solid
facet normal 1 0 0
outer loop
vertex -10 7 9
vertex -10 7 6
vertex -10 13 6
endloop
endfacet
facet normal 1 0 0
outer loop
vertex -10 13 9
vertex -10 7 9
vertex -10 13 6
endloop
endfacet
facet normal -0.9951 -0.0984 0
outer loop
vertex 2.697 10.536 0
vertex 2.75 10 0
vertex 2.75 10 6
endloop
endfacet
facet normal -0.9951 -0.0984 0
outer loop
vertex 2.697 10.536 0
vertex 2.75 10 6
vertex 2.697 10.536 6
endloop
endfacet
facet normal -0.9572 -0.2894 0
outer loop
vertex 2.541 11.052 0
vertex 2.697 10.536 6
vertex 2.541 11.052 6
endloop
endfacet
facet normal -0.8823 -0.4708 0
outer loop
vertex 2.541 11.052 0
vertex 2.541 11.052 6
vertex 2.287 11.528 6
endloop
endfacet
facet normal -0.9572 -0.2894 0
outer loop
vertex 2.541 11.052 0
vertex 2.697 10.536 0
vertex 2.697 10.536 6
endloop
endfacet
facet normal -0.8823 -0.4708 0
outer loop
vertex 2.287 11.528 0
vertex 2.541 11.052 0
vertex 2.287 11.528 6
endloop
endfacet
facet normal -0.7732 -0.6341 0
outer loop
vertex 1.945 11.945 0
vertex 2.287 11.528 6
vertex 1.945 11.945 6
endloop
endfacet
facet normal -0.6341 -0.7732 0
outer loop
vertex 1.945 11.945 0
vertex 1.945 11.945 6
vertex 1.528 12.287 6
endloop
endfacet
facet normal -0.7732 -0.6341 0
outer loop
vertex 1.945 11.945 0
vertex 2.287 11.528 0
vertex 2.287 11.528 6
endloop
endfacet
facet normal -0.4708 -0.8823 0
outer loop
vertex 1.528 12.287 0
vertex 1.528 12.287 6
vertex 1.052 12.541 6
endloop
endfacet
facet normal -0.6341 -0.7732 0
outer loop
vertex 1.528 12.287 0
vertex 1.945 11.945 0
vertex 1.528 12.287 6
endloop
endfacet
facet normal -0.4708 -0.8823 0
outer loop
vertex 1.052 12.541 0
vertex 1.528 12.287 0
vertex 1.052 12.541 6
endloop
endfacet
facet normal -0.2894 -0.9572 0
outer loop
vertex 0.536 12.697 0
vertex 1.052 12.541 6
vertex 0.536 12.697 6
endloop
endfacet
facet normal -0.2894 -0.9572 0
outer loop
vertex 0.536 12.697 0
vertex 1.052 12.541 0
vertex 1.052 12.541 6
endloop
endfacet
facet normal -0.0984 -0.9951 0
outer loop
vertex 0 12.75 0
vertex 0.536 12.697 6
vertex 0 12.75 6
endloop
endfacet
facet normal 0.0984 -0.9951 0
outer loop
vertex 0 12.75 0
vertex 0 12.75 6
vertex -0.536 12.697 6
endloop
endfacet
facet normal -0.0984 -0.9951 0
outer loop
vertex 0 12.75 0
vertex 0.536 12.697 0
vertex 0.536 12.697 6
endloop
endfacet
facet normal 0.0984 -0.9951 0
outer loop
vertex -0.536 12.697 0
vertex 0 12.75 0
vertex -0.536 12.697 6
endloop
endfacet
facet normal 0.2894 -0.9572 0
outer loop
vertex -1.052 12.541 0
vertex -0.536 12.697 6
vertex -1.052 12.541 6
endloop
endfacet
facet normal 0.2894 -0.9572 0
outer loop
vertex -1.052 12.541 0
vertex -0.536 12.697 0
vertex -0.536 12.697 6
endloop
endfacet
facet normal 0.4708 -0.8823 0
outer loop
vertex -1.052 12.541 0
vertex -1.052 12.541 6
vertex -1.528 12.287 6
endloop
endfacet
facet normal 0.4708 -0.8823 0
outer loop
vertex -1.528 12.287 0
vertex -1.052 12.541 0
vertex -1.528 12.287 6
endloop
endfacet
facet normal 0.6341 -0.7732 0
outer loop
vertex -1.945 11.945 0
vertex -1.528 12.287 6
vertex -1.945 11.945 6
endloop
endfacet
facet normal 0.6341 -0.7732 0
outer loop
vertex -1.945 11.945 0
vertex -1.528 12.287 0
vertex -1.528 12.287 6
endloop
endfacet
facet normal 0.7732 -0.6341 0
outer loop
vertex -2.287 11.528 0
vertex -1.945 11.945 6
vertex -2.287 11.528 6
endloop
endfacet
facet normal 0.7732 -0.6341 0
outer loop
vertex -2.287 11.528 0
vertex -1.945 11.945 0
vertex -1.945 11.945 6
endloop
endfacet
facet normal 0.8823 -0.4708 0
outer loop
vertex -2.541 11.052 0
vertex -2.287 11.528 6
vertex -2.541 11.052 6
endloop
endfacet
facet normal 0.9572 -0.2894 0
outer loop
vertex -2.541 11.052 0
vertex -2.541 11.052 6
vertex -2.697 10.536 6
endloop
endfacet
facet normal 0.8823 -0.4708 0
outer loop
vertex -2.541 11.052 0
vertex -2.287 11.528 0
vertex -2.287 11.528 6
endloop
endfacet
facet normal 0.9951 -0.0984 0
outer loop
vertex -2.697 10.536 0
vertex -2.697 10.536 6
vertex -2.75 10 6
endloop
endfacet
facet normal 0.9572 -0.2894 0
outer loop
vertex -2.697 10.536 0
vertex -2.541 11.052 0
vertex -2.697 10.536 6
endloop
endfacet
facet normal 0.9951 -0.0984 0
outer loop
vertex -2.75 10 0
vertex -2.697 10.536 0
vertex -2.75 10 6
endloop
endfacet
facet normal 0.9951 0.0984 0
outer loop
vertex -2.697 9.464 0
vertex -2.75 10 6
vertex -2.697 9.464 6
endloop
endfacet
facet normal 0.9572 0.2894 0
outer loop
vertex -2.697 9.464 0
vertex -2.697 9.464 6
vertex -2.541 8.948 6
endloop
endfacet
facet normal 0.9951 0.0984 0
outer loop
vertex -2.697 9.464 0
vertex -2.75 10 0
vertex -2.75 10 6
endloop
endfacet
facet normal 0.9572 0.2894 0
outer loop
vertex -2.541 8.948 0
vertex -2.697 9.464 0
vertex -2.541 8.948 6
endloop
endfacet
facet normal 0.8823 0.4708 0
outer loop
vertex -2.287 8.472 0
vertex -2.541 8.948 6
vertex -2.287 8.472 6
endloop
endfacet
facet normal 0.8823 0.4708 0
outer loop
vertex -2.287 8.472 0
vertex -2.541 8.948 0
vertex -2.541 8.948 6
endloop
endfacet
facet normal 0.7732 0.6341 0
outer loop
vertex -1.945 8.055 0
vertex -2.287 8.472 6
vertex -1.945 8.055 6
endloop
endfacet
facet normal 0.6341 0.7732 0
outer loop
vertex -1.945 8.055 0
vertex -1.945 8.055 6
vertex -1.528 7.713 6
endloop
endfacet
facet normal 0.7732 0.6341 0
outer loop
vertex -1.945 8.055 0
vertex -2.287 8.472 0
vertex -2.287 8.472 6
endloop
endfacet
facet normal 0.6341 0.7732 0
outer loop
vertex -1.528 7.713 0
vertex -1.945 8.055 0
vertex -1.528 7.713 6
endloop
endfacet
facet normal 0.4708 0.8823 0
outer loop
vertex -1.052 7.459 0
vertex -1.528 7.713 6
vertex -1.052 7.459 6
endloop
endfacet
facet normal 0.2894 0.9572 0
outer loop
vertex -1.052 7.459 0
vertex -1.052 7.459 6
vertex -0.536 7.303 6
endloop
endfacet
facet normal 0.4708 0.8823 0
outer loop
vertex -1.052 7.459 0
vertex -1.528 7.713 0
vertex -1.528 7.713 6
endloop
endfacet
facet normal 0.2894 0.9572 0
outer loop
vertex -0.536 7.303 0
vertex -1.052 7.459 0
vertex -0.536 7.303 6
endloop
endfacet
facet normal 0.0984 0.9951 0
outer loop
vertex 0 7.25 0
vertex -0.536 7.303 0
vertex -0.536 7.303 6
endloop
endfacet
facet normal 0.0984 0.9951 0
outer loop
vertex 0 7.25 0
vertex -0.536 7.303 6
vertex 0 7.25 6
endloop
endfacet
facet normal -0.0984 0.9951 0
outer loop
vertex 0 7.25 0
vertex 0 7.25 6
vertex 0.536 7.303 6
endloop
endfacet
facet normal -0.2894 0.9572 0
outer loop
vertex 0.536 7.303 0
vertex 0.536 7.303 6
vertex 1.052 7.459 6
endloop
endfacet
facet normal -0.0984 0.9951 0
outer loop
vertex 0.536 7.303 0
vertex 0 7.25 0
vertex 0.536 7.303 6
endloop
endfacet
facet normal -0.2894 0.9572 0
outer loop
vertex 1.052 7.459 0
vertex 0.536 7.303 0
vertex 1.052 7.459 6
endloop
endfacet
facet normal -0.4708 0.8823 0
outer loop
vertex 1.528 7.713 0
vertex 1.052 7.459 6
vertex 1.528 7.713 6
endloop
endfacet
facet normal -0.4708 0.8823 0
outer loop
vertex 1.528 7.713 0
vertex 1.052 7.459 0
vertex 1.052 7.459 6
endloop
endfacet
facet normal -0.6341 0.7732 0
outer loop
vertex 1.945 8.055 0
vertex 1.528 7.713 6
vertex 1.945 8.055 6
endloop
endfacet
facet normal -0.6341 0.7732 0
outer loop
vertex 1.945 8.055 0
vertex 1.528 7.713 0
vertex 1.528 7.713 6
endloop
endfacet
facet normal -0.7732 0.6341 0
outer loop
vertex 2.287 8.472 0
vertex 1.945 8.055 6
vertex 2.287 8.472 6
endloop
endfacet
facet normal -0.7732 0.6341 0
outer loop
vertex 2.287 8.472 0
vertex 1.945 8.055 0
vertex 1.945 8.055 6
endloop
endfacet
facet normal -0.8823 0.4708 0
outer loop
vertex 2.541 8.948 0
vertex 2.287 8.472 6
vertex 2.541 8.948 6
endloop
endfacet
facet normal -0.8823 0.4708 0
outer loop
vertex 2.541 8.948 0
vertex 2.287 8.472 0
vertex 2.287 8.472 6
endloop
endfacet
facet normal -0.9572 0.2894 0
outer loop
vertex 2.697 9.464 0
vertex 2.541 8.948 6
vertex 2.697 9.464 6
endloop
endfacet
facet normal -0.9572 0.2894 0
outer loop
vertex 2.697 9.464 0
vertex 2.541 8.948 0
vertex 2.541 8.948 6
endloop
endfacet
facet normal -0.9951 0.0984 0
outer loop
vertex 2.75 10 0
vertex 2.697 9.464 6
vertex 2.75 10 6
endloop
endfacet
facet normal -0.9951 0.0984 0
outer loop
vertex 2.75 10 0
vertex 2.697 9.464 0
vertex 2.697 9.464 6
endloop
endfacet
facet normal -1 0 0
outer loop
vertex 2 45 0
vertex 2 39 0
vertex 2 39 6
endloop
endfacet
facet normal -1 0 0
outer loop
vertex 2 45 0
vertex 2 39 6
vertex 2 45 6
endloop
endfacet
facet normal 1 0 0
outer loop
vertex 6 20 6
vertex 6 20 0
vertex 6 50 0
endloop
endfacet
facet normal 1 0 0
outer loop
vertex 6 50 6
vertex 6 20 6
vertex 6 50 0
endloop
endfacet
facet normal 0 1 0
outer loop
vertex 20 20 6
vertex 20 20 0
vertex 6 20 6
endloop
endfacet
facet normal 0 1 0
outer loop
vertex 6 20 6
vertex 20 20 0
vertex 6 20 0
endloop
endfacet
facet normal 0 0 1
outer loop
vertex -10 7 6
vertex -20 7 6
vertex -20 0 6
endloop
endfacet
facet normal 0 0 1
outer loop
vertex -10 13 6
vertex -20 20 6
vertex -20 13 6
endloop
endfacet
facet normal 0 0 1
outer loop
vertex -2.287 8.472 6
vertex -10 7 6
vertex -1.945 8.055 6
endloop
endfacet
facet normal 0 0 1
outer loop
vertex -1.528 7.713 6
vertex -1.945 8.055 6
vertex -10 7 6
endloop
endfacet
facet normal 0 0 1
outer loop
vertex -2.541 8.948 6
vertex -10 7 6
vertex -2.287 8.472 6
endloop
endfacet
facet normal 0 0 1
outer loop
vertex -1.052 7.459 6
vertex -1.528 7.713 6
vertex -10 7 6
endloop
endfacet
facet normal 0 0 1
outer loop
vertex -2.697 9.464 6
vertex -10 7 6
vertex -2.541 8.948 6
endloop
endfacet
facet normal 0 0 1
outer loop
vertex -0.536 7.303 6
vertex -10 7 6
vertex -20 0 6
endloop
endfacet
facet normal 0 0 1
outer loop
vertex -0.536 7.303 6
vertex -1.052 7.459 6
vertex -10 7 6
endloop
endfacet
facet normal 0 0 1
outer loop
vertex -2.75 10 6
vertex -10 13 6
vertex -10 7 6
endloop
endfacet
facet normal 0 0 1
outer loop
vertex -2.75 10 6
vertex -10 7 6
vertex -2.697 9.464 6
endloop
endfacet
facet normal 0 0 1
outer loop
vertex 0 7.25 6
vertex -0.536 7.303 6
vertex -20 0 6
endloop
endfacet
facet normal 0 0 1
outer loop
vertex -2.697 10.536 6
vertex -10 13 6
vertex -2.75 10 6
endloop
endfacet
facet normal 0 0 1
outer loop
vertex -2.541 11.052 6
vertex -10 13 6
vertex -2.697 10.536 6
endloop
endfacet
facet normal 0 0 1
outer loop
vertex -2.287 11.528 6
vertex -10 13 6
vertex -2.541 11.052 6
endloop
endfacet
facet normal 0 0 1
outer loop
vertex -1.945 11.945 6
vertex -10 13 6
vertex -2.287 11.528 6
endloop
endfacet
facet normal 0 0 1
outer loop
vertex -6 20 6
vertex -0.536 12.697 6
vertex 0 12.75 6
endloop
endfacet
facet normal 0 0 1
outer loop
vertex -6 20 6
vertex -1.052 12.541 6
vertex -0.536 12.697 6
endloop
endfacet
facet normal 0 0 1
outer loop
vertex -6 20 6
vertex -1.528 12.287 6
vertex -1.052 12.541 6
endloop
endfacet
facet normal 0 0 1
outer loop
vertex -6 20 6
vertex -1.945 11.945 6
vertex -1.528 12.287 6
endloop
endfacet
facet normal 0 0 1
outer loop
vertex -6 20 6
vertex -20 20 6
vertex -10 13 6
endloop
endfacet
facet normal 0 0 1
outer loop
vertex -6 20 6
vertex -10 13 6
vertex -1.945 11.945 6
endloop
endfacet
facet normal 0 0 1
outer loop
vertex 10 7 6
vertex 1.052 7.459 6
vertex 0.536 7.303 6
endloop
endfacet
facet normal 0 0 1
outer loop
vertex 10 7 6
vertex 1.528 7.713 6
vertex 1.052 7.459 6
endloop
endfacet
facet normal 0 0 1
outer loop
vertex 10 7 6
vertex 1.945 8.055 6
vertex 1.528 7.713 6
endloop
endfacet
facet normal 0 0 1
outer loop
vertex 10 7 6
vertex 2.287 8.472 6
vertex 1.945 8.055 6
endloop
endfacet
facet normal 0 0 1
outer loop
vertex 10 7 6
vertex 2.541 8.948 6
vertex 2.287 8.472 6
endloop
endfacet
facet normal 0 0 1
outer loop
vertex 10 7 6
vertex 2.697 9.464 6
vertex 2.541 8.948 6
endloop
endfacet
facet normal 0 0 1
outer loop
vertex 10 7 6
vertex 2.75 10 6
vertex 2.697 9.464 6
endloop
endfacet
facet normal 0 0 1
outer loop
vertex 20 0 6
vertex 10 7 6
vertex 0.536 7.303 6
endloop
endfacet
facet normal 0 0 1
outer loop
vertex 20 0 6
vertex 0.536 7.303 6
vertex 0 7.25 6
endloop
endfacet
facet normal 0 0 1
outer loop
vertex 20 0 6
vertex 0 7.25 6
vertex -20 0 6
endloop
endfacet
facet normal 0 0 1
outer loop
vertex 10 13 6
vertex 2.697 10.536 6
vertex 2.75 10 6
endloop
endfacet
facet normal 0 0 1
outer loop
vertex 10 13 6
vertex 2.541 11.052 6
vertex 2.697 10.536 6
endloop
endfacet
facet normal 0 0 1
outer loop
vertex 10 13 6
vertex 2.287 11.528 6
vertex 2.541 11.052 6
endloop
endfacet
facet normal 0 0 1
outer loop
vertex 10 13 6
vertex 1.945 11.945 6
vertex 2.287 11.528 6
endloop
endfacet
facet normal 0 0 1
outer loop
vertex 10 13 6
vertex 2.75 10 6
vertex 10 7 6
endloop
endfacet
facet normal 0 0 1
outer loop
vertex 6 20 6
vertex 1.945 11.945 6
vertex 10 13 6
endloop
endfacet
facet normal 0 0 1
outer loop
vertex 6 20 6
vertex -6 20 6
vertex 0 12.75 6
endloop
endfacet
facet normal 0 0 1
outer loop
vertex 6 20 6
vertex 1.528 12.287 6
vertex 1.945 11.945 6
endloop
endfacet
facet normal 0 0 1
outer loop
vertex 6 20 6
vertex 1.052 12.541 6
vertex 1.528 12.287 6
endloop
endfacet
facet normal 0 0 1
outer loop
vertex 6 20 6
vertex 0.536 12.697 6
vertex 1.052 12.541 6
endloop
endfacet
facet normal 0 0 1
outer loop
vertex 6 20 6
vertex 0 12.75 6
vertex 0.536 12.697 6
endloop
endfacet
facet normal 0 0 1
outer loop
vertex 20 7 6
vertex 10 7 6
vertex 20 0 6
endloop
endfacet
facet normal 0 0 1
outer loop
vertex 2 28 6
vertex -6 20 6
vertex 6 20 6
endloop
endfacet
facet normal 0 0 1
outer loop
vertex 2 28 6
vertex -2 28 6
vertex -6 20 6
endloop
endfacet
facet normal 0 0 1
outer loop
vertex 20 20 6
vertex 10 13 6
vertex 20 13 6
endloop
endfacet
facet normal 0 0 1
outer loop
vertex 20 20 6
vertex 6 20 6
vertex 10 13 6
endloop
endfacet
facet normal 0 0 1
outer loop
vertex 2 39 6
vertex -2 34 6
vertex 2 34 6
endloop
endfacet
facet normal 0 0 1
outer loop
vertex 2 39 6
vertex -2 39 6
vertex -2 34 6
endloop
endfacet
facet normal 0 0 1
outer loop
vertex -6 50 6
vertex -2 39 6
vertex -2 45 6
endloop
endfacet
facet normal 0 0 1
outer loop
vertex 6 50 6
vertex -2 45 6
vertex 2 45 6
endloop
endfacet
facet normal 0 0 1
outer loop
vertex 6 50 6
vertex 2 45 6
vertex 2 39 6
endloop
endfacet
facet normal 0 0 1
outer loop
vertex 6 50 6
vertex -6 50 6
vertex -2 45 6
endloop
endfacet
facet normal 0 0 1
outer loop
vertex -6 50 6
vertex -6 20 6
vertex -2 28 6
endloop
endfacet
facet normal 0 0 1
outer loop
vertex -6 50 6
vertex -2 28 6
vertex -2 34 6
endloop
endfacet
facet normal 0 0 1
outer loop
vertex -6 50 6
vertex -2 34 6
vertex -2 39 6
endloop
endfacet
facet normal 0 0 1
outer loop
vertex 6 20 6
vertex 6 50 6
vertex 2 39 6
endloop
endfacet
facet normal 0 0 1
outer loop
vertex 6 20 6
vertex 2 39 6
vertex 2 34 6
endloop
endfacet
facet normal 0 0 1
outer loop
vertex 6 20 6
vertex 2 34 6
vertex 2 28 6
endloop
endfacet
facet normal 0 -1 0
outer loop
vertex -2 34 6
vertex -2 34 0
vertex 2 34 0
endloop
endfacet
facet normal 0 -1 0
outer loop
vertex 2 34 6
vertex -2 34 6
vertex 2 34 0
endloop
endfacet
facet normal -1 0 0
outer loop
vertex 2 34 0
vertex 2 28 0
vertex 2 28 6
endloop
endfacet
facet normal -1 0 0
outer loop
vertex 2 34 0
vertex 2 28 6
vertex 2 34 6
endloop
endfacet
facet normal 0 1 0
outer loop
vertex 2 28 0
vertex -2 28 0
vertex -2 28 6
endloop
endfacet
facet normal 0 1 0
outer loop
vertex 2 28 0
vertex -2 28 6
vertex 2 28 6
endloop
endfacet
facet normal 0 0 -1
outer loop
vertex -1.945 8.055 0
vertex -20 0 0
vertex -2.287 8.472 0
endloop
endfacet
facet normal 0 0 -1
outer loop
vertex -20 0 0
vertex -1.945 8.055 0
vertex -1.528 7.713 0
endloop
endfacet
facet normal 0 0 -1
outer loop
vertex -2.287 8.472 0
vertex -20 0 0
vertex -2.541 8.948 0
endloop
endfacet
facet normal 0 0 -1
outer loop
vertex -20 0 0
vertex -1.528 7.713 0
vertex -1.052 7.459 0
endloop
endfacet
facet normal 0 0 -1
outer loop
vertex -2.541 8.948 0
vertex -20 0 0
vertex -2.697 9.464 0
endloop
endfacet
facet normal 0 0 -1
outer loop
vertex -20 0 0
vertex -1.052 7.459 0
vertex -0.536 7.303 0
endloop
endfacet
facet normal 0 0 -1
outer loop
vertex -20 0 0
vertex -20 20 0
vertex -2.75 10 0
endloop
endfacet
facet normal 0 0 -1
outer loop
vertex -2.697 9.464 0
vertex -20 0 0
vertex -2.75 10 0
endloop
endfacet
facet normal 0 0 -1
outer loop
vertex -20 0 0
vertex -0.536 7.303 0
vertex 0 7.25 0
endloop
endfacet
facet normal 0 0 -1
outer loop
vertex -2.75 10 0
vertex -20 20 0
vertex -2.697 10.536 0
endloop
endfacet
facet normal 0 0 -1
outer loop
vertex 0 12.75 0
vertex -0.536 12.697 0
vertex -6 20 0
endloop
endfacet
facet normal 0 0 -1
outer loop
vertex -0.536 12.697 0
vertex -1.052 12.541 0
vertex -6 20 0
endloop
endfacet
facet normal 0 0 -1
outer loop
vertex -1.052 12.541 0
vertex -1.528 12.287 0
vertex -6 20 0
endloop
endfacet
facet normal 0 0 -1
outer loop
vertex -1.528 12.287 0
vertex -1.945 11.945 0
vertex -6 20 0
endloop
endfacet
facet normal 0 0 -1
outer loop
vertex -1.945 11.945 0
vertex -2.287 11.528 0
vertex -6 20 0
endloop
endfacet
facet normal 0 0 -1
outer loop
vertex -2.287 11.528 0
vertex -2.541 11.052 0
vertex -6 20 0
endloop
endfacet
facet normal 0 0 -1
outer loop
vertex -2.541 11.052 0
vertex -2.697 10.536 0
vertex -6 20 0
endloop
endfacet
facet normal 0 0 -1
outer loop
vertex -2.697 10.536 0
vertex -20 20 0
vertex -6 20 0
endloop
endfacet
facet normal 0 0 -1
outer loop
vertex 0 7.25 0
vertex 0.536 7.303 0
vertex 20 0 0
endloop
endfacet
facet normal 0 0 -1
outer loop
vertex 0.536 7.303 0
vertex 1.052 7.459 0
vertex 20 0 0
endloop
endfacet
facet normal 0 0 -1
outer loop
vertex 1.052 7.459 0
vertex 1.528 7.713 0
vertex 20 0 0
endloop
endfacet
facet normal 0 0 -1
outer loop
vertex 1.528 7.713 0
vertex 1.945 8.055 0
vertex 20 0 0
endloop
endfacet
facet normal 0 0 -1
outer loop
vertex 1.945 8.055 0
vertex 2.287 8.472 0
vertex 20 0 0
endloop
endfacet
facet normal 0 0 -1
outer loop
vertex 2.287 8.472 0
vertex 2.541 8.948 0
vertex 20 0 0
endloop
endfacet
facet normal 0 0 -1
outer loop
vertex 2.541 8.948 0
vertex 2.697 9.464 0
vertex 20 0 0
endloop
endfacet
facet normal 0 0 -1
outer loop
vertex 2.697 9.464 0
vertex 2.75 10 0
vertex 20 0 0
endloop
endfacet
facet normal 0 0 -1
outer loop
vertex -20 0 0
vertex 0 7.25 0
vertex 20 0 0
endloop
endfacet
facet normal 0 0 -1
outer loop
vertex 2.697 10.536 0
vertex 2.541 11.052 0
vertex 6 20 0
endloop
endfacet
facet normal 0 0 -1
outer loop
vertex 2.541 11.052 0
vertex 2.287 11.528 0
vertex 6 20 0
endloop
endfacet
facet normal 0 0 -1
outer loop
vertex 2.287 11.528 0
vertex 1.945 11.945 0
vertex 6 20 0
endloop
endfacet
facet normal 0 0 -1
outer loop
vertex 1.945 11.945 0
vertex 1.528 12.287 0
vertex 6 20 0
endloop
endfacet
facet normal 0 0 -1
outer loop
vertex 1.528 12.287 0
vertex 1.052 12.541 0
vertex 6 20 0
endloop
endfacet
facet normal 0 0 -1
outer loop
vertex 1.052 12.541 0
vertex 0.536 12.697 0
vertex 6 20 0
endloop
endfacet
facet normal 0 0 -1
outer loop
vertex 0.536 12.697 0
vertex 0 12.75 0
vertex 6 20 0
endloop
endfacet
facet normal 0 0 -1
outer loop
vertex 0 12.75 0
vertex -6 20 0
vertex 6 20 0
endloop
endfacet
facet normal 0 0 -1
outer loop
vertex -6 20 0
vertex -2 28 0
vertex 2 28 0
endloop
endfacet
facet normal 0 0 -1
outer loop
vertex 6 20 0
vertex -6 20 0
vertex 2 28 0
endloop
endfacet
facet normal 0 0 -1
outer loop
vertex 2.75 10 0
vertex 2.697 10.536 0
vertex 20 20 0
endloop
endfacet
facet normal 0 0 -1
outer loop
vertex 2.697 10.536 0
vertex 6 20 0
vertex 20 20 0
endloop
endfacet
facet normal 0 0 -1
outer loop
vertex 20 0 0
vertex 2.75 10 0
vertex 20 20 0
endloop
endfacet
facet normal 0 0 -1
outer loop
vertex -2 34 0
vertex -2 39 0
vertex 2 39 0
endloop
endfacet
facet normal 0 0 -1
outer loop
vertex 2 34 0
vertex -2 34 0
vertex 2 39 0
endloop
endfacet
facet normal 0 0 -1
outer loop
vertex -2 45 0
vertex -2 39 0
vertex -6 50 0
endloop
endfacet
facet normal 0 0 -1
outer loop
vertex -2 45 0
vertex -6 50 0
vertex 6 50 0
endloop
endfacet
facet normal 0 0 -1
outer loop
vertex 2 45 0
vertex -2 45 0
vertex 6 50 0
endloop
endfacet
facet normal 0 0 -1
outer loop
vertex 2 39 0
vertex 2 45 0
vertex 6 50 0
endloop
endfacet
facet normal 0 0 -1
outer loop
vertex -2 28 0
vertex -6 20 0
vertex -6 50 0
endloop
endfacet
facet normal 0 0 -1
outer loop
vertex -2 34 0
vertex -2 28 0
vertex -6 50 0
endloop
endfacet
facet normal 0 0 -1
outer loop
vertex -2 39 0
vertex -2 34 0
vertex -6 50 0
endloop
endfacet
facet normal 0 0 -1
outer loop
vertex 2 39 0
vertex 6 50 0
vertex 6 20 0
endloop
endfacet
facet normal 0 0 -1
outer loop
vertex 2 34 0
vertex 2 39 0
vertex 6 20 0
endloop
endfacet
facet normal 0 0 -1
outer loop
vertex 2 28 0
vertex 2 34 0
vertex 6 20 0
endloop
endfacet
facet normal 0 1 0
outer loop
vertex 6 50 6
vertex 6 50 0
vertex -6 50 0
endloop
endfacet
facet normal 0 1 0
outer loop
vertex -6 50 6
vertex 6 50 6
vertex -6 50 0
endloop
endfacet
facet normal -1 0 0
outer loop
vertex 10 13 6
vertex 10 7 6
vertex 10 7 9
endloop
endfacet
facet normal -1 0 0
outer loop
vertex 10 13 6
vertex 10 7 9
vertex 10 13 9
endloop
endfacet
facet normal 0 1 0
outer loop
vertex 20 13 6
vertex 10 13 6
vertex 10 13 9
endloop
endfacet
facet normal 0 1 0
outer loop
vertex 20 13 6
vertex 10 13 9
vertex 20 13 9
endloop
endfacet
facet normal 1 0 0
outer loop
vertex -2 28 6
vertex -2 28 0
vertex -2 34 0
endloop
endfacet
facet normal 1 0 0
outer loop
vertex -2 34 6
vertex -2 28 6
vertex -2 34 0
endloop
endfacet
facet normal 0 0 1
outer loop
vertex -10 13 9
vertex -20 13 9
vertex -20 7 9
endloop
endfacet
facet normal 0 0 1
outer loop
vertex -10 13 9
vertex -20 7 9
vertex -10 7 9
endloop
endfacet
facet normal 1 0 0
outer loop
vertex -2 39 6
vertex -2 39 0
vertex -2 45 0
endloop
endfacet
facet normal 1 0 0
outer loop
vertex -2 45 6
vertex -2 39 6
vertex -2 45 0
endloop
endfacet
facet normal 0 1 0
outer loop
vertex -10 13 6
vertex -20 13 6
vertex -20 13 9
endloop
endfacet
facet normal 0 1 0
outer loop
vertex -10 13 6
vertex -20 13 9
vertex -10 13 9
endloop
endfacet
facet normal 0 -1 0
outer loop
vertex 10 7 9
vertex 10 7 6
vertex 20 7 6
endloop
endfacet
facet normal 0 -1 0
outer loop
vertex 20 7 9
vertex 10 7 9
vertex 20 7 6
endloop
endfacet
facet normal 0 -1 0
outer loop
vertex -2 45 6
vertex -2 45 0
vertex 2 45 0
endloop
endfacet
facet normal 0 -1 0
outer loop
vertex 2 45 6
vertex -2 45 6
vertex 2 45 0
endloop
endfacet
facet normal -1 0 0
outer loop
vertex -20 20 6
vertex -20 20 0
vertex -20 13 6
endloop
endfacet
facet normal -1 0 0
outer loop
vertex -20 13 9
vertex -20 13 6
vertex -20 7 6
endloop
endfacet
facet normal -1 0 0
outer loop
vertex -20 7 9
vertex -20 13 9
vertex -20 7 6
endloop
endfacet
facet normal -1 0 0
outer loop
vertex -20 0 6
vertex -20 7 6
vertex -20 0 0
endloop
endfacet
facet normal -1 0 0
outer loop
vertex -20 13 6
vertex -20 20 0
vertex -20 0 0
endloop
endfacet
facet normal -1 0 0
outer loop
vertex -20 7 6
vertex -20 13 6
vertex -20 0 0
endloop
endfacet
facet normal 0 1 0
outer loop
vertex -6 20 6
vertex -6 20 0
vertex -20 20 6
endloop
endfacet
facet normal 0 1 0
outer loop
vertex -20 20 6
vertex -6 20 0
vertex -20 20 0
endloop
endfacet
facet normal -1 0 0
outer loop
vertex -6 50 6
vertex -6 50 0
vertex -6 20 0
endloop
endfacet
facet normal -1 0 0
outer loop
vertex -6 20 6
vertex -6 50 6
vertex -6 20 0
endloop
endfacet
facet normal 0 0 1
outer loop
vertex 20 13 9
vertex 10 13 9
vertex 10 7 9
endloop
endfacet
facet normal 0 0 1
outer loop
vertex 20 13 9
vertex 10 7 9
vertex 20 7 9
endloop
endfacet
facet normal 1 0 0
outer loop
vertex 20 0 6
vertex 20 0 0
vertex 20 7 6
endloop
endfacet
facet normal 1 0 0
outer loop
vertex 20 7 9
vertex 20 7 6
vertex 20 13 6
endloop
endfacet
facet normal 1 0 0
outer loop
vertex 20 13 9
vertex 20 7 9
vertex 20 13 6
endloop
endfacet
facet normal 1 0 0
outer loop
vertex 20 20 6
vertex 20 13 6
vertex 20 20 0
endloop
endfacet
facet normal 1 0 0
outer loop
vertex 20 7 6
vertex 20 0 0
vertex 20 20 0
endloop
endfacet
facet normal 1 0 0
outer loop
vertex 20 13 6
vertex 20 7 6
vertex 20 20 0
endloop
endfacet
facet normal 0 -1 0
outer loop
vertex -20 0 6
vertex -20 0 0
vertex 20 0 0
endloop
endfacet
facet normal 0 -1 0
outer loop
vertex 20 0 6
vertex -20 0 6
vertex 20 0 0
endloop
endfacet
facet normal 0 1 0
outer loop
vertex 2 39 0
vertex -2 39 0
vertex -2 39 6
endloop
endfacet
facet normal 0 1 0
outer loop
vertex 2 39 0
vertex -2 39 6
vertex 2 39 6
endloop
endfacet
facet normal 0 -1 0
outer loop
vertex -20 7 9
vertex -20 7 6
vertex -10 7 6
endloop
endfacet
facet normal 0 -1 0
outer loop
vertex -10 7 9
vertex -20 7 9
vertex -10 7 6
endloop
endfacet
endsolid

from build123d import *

# Parameters (mm, degrees)
SKETCH_R     = 2.75
SKETCH_W     = 4
SKETCH_H     = 6
PAD_DEPTH    = 6
SKETCH001_W  = 10
SKETCH001_H  = 6
PAD001_DEPTH = 3


with BuildPart() as part:
    # Sketch → Pad (new body)
    with BuildSketch(Plane.XY):
        Polygon((-6, 50), (-6, 20), (-20, 20), (-20, 0), (20, 0), (20, 20), (6, 20), (6, 50), align=None)
        with Locations((0, 10)):
            Circle(SKETCH_R, mode=Mode.SUBTRACT)
        with Locations((0, 42)):
            Rectangle(SKETCH_W, SKETCH_H, mode=Mode.SUBTRACT)
        with Locations((0, 31)):
            Rectangle(SKETCH_W, SKETCH_H, mode=Mode.SUBTRACT)
    extrude(amount=PAD_DEPTH)

    # Sketch001 (on Face19 of Pad) → Pad001 (join)
    with BuildSketch(Plane.XY.offset(6)):
        with Locations((-15, 10)):
            Rectangle(SKETCH001_W, SKETCH001_H)
        with Locations((15, 10)):
            Rectangle(SKETCH001_W, SKETCH001_H)
    extrude(amount=PAD001_DEPTH)


solid = part.part
